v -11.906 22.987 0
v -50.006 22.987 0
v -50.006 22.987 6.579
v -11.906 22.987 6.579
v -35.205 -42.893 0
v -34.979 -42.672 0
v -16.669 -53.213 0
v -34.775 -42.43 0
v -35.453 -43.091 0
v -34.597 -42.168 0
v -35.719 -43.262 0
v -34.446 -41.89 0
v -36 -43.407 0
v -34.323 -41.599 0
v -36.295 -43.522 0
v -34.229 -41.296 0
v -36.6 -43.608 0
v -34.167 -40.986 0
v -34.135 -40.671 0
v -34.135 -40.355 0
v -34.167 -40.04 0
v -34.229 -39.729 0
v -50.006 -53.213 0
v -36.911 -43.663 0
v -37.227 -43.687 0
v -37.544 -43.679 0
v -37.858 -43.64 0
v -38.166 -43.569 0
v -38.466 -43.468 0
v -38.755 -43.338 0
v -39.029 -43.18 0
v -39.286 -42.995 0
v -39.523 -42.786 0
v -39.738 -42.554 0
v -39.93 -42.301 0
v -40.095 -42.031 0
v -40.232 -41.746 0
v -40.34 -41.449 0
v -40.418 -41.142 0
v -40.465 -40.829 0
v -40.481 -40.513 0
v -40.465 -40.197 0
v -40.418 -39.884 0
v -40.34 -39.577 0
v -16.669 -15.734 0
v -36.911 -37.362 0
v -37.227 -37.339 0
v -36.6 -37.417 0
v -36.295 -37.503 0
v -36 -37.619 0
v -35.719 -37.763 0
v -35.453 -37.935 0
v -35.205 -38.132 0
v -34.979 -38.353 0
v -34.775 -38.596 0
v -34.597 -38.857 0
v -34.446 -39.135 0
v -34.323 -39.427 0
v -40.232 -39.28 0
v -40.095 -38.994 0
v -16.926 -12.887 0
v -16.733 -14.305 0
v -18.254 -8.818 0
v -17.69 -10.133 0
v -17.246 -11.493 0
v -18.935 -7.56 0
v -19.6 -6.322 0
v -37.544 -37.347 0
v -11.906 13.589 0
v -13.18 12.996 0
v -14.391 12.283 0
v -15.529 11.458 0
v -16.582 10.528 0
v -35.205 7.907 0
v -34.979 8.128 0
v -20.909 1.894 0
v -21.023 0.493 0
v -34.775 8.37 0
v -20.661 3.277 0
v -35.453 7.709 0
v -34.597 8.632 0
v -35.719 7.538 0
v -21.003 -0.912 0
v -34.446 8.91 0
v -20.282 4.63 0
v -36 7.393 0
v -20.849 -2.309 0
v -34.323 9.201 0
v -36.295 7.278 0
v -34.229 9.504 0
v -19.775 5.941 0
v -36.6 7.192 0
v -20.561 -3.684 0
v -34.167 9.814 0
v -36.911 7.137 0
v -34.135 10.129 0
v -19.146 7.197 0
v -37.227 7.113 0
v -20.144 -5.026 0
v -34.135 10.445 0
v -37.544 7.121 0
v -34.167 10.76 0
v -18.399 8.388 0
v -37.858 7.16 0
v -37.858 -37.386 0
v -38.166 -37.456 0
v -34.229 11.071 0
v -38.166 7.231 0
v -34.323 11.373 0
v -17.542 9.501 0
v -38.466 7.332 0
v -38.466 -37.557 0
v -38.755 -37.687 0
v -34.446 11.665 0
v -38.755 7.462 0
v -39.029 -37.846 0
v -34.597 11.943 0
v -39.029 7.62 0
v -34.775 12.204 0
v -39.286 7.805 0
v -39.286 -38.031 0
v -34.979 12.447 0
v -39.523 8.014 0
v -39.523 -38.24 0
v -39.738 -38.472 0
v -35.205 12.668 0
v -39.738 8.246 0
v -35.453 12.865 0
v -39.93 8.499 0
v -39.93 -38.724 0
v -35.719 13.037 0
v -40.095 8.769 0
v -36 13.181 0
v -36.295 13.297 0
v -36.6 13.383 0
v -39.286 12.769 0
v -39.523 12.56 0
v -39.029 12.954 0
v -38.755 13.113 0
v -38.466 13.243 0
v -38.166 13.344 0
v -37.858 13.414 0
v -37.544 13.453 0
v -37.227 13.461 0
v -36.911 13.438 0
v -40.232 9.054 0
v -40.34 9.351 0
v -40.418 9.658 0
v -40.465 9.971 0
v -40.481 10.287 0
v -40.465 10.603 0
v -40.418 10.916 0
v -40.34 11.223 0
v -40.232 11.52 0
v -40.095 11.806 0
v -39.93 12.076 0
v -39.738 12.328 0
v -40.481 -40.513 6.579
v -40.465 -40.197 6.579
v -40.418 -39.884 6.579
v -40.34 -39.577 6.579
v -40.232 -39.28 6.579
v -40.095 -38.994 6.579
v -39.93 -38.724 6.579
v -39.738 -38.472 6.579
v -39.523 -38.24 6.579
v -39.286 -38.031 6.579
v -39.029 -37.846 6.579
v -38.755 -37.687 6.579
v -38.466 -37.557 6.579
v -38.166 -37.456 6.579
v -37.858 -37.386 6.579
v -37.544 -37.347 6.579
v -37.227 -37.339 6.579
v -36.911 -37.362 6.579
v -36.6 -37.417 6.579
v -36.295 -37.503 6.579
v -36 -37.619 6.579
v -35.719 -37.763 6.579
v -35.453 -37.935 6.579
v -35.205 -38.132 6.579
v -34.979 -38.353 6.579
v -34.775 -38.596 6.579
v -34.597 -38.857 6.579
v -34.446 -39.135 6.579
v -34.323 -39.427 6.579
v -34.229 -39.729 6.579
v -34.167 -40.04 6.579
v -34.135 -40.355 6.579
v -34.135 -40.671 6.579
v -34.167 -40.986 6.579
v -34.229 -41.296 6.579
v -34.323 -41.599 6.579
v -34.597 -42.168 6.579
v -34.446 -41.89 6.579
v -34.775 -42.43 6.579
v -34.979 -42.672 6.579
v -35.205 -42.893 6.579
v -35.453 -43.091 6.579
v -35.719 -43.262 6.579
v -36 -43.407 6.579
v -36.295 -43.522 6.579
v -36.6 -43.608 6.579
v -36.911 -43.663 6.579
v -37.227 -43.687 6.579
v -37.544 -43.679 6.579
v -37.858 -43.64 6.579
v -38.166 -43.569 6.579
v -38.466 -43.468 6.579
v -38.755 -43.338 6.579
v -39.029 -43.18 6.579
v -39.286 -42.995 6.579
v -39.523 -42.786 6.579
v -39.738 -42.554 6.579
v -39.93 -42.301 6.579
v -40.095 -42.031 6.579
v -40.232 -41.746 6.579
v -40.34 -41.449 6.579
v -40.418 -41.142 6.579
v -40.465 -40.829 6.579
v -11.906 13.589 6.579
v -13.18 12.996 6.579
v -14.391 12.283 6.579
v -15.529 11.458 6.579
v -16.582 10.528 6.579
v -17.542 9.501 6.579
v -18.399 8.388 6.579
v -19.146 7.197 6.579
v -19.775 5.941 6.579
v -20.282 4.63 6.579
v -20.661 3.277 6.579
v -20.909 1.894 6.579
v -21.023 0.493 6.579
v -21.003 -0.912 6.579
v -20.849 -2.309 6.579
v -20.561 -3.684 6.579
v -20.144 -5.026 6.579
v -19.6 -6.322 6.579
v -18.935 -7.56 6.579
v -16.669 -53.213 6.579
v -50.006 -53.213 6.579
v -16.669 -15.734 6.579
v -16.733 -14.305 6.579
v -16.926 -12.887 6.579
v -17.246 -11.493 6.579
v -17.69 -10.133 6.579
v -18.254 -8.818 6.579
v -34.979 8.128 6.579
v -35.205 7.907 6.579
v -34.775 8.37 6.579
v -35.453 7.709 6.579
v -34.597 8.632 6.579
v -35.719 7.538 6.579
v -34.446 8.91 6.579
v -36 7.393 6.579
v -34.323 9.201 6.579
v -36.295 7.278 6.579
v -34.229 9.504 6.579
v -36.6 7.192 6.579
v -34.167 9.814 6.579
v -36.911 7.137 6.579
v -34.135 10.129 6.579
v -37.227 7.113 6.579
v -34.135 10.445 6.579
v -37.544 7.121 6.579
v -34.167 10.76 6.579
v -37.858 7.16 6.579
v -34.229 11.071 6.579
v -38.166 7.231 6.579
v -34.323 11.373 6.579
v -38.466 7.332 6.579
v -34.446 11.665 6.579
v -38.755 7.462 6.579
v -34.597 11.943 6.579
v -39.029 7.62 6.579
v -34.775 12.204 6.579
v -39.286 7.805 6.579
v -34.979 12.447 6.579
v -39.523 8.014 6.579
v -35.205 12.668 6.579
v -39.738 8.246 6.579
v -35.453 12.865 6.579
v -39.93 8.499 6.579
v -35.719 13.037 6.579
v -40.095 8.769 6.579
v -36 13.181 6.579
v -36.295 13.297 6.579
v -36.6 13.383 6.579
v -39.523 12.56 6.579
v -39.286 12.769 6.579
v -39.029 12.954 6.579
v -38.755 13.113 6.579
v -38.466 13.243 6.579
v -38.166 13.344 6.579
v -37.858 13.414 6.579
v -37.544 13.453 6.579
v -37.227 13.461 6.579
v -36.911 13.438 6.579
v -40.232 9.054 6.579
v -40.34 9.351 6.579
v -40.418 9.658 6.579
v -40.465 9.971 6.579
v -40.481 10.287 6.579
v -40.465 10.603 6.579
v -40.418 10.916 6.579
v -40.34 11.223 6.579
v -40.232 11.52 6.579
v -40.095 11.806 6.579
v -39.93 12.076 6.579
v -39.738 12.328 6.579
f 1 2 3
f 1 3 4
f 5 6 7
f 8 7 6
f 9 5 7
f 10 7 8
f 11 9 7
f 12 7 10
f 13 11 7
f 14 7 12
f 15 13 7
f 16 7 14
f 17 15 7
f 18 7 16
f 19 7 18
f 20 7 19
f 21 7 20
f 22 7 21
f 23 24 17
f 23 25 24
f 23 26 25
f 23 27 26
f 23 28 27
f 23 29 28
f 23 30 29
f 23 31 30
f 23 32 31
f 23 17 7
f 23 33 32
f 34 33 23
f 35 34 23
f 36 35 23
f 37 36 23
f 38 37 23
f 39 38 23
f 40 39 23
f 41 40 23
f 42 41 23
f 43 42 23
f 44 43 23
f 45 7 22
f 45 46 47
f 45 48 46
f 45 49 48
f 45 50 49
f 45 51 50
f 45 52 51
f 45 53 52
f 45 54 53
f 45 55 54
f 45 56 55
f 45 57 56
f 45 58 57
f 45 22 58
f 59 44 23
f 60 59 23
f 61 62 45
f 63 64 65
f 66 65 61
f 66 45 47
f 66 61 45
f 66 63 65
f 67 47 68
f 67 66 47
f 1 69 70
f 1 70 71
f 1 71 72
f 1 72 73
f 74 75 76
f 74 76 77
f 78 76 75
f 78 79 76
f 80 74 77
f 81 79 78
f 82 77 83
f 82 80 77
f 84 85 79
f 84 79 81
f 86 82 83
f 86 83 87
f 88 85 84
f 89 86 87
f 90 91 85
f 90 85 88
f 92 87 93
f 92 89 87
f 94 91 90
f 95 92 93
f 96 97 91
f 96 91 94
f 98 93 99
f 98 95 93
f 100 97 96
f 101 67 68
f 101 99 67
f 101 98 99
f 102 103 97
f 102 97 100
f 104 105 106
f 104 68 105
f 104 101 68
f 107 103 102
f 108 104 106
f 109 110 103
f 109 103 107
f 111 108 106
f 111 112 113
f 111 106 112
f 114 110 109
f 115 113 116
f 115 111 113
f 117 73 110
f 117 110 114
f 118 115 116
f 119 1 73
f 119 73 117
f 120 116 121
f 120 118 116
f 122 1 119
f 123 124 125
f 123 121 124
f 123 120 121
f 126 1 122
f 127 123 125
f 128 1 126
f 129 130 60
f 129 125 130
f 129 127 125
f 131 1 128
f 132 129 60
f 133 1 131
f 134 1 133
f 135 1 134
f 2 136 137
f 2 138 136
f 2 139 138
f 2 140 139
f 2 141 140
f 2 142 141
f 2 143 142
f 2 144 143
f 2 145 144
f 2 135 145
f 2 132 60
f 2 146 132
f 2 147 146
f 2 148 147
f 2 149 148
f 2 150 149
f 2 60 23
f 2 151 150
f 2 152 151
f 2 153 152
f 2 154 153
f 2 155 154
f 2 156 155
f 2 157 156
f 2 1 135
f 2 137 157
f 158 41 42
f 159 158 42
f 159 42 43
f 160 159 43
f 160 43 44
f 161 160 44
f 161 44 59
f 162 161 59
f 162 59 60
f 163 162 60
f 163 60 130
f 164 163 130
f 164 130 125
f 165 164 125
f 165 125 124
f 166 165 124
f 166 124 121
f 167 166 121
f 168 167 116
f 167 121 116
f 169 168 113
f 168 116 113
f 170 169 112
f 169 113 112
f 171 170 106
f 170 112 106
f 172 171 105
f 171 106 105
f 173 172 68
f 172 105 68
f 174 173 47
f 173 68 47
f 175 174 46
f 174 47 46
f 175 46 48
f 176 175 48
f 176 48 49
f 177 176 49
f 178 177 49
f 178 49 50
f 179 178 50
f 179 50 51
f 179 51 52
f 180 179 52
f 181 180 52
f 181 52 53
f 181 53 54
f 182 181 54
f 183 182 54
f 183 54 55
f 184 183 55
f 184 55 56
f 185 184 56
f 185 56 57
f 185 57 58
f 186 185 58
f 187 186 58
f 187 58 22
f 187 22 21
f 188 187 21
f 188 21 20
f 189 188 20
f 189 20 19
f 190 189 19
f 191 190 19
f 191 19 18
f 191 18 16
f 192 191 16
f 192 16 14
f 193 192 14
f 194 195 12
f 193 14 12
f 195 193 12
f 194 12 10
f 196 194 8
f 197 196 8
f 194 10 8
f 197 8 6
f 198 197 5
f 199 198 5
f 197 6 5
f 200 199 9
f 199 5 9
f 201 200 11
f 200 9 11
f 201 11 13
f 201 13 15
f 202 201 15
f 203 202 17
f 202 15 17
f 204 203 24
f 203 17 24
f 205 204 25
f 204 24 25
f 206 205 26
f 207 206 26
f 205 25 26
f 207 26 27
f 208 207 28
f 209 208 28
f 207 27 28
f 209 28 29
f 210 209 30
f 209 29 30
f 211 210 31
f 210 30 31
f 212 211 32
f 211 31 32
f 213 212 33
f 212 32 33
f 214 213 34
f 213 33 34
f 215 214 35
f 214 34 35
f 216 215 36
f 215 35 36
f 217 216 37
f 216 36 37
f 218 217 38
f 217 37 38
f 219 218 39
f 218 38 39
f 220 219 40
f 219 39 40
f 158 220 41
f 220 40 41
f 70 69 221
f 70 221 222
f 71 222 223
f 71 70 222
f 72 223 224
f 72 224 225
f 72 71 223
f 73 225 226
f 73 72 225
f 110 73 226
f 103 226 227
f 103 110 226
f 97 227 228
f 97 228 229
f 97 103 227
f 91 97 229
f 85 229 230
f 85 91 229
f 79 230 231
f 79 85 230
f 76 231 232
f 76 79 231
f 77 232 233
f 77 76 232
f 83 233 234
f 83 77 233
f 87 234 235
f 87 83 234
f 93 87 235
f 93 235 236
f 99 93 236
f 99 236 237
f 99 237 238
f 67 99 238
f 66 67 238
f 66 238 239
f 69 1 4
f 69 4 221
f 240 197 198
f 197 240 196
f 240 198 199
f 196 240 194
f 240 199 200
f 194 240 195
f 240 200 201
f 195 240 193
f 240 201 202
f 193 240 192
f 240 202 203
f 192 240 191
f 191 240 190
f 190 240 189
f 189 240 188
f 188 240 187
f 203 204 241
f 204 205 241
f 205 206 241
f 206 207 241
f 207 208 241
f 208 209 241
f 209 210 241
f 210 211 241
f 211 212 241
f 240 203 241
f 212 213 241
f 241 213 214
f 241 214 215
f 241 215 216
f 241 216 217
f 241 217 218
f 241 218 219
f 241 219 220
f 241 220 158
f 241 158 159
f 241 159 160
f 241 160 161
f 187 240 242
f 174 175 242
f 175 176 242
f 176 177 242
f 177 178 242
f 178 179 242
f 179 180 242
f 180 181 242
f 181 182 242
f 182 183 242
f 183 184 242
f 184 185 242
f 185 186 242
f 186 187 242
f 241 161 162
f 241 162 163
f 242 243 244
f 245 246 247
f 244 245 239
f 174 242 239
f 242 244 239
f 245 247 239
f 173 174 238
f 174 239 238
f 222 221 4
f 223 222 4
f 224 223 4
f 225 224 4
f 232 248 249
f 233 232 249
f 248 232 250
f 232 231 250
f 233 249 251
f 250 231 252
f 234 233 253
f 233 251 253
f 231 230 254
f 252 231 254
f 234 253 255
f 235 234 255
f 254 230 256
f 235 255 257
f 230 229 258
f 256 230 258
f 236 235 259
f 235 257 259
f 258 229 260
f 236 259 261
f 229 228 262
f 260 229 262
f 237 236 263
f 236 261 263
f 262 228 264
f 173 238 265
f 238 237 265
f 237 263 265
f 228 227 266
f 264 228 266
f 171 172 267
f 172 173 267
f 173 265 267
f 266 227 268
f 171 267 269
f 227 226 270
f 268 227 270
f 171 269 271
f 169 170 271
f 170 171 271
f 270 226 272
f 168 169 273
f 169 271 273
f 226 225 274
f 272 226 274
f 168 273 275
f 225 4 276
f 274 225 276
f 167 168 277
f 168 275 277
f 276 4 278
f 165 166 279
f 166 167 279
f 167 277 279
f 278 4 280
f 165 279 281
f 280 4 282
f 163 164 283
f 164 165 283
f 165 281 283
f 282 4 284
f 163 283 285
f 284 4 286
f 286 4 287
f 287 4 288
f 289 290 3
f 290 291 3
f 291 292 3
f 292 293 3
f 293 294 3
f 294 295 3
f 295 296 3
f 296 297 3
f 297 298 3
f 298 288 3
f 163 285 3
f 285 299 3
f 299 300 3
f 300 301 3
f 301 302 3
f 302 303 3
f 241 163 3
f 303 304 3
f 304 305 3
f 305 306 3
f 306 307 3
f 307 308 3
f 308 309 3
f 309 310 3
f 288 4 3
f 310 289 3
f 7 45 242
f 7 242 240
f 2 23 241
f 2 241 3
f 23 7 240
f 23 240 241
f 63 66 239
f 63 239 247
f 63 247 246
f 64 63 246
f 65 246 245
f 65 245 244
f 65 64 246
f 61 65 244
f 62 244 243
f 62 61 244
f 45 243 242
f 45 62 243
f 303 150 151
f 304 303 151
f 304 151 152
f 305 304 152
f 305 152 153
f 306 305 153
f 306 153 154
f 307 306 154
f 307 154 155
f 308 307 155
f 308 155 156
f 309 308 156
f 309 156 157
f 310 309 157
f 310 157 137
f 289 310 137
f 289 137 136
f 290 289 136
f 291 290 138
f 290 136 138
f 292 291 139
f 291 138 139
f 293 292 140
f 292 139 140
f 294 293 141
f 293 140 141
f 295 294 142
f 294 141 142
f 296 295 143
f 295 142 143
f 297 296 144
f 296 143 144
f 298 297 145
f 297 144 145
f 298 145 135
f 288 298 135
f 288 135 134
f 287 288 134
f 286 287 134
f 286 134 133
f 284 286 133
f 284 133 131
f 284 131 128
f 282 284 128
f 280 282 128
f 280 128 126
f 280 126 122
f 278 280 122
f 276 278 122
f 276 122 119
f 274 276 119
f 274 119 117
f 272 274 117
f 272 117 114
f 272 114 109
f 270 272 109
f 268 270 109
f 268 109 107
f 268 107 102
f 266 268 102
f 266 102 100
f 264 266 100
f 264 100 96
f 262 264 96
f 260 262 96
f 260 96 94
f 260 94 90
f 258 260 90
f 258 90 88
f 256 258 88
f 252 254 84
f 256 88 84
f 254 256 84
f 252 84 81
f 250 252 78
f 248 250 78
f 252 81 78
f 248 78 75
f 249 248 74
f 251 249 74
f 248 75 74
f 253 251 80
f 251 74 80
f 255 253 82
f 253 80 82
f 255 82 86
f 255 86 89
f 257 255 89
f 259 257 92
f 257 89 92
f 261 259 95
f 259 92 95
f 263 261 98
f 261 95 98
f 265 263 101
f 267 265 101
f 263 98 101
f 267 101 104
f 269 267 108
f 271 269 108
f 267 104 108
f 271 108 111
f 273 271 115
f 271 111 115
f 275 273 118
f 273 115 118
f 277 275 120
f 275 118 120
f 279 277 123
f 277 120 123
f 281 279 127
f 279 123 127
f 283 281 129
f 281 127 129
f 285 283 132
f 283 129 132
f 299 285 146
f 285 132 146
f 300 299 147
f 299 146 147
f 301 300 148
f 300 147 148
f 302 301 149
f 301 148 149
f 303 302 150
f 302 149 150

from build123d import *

# Parameters (mm, degrees)
BOSS_EXTRUDE1_DEPTH        = 6.5786
F_97_0_25_DIAMETER_HOLE1_D = 6.35


with BuildPart() as part:
    # Sketch2 → Boss-Extrude1 (new body)
    with BuildSketch(Plane.XY):
        with BuildLine():
            Line((-16.66875, -15.734319794), (-16.66875, -39.617329943))
            Line((-16.66875, -39.617329943), (-16.66875, -49.389319794))
            Line((-16.66875, -49.389319794), (-16.66875, -53.212823447))
            Line((-16.66875, -53.212823447), (-50.00625, -53.212823447))
            Line((-50.00625, -53.212823447), (-50.00625, 22.987176553))
            Line((-50.00625, 22.987176553), (-11.90625, 22.987176553))
            Line((-11.90625, 22.987176553), (-11.90625, 13.589176553))
            ThreePointArc((-11.90625, 13.589176553), (-20.281897601, 4.630319933), (-18.935193267, -7.559797873))
            ThreePointArc((-18.935193267, -7.559797873), (-17.24585042, -11.492870345), (-16.66875, -15.734319794))
        make_face()
    extrude(amount=BOSS_EXTRUDE1_DEPTH)

    # #97 (0.25) Diameter Hole1 (through all)
    with Locations(Plane(origin=(-37.30625, 10.287176553, 6.5786), x_dir=(1, 0, 0), z_dir=(0, 0, 1))):
        with Locations((0, 0), (0, -50.8)):
            Hole(F_97_0_25_DIAMETER_HOLE1_D / 2)


solid = part.part
